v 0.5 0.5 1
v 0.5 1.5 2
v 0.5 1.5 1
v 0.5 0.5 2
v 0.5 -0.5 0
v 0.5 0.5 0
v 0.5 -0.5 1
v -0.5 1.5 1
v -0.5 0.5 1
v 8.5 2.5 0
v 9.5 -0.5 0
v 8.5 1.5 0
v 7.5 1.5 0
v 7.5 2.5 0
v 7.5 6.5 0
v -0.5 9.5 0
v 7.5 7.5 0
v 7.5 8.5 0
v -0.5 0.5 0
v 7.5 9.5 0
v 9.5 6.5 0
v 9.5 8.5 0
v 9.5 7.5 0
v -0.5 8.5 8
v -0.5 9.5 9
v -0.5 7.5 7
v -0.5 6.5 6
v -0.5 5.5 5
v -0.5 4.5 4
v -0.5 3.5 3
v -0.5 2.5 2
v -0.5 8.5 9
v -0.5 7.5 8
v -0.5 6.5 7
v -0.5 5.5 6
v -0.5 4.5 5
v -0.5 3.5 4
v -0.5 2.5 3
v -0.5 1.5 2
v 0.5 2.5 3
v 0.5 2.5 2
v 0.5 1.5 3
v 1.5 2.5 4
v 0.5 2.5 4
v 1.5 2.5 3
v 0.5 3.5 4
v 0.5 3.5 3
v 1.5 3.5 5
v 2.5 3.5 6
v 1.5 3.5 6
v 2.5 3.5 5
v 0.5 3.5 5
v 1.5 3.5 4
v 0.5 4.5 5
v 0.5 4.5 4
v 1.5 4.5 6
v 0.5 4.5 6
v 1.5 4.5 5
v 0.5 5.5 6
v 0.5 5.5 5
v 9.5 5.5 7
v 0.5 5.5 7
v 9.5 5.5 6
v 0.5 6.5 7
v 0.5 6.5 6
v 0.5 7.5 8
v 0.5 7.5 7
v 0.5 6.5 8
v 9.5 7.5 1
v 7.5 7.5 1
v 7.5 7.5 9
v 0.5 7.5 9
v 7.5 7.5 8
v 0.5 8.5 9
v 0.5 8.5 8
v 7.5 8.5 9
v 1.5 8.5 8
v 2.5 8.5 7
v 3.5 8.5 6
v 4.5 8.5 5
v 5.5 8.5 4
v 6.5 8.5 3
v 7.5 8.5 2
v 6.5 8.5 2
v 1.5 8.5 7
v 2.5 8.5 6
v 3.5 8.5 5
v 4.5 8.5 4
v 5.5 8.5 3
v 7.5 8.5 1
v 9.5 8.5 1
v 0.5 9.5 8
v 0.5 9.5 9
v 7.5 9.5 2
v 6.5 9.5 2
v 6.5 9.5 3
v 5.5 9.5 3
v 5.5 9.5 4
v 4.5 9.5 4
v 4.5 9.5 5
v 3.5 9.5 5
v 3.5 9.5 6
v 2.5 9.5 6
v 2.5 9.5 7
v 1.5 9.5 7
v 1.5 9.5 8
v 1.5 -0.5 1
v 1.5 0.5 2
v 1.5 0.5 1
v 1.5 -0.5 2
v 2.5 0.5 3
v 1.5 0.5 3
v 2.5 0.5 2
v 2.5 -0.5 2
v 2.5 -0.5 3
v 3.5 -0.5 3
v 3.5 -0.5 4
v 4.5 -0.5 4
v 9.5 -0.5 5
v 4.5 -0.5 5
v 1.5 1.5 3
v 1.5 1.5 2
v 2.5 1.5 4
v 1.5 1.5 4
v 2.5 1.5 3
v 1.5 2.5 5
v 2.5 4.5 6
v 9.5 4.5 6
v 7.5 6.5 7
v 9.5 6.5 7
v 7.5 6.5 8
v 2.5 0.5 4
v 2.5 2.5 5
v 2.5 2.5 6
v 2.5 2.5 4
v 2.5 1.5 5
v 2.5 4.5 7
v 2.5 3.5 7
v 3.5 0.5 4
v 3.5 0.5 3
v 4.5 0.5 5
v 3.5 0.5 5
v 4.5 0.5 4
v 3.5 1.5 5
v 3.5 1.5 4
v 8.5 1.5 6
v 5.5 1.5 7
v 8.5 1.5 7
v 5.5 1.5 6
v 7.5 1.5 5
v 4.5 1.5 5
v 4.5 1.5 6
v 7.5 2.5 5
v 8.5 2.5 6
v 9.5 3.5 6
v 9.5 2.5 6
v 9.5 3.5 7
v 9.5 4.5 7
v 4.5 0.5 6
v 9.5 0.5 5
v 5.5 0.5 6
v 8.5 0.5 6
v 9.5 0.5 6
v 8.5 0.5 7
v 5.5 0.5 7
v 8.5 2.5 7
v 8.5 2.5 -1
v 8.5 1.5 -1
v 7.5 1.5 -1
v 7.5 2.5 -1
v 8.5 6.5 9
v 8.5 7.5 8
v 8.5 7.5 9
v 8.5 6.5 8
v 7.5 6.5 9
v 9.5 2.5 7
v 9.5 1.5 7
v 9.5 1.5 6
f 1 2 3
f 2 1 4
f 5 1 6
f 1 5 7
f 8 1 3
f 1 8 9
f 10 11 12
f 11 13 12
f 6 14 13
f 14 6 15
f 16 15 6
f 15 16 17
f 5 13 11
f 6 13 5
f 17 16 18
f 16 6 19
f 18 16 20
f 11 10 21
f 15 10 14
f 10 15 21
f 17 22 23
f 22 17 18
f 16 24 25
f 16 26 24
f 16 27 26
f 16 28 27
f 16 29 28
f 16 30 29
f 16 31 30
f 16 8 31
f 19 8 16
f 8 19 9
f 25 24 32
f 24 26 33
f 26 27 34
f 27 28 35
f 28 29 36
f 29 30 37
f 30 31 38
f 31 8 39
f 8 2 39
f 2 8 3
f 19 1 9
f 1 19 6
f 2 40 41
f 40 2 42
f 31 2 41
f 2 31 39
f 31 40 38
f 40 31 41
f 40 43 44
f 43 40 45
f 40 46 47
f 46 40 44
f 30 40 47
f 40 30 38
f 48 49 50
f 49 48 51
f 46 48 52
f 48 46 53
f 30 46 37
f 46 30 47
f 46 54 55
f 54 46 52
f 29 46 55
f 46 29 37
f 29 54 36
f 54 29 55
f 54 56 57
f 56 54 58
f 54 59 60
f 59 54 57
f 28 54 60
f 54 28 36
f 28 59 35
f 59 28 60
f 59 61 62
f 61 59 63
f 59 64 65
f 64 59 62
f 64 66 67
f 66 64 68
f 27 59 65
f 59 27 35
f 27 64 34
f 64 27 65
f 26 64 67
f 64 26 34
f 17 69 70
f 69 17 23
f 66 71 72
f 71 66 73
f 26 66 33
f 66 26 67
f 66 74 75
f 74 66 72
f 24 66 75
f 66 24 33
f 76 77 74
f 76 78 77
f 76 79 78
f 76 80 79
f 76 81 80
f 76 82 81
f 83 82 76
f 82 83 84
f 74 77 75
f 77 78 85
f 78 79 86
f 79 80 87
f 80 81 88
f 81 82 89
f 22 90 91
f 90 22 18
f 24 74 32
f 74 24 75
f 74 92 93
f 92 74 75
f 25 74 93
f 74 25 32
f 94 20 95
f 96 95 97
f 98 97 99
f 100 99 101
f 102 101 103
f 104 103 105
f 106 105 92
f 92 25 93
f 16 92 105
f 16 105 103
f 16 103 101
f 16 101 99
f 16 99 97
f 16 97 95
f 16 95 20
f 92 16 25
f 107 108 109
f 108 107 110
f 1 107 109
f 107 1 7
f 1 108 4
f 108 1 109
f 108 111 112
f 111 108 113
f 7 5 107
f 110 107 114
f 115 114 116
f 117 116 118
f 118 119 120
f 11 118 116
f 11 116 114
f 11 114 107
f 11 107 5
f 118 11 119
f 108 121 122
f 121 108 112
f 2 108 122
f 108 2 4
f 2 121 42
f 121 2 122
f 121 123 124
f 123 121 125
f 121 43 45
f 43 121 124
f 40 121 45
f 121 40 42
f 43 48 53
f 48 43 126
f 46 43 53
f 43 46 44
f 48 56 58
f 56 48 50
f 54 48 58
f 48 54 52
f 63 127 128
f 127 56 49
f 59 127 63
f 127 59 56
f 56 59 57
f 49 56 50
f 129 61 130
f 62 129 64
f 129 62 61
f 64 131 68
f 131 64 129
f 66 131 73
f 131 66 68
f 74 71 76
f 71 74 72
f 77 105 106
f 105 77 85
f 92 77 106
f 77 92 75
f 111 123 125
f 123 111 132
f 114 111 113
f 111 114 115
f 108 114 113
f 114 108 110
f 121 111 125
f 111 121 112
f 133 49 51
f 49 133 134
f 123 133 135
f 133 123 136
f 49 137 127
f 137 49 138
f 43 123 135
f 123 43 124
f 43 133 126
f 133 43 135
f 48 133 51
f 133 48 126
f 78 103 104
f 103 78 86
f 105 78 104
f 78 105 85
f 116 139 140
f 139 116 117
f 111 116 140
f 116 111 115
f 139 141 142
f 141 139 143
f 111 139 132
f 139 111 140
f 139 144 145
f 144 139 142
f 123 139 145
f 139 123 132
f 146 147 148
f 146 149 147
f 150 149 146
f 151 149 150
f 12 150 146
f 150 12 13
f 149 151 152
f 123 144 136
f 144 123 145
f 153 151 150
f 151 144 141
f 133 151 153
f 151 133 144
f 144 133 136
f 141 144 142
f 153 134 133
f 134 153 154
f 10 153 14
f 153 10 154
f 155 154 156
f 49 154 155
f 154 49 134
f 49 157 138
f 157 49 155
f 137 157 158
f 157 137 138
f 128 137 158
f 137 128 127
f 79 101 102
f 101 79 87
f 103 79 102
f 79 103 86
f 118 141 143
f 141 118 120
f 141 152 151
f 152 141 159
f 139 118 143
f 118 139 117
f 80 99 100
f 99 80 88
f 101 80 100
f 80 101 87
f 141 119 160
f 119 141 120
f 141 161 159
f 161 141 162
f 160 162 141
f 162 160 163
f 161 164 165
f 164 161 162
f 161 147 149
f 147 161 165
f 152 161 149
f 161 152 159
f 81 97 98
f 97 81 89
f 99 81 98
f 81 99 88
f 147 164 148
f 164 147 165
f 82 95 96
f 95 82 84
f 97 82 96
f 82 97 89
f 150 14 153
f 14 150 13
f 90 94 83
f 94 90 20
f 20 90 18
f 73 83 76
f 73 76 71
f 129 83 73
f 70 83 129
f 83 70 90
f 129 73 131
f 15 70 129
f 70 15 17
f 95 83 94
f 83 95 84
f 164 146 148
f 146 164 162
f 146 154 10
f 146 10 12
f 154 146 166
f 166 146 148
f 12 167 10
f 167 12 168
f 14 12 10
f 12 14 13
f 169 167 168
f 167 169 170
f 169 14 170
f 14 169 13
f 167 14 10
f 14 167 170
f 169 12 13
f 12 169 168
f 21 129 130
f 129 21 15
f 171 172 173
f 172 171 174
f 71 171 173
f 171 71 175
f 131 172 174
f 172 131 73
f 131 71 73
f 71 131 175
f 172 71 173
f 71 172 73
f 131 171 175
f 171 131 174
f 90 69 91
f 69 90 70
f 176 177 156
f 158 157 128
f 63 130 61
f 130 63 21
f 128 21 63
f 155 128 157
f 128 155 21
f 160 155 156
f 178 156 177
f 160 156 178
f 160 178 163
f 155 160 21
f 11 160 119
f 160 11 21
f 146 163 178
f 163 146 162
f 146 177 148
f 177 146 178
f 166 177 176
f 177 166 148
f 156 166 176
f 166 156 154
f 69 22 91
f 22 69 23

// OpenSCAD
union() {
    translate([0, 1, 0.5]) cube([1, 1, 1], center=true);
    translate([0, 2, 1.0]) cube([1, 1, 2], center=true);
    translate([0, 3, 1.5]) cube([1, 1, 3], center=true);
    translate([0, 4, 2.0]) cube([1, 1, 4], center=true);
    translate([0, 5, 2.5]) cube([1, 1, 5], center=true);
    translate([0, 6, 3.0]) cube([1, 1, 6], center=true);
    translate([0, 7, 3.5]) cube([1, 1, 7], center=true);
    translate([0, 8, 4.0]) cube([1, 1, 8], center=true);
    translate([0, 9, 4.5]) cube([1, 1, 9], center=true);
    translate([1, 0, 0.5]) cube([1, 1, 1], center=true);
    translate([1, 1, 1.0]) cube([1, 1, 2], center=true);
    translate([1, 2, 1.5]) cube([1, 1, 3], center=true);
    translate([1, 3, 2.0]) cube([1, 1, 4], center=true);
    translate([1, 4, 2.5]) cube([1, 1, 5], center=true);
    translate([1, 5, 3.0]) cube([1, 1, 6], center=true);
    translate([1, 6, 3.5]) cube([1, 1, 7], center=true);
    translate([1, 7, 4.0]) cube([1, 1, 8], center=true);
    translate([1, 8, 4.5]) cube([1, 1, 9], center=true);
    translate([1, 9, 4.0]) cube([1, 1, 8], center=true);
    translate([2, 0, 1.0]) cube([1, 1, 2], center=true);
    translate([2, 1, 1.5]) cube([1, 1, 3], center=true);
    translate([2, 2, 2.0]) cube([1, 1, 4], center=true);
    translate([2, 3, 2.5]) cube([1, 1, 5], center=true);
    translate([2, 4, 3.0]) cube([1, 1, 6], center=true);
    translate([2, 5, 3.0]) cube([1, 1, 6], center=true);
    translate([2, 6, 3.5]) cube([1, 1, 7], center=true);
    translate([2, 7, 4.0]) cube([1, 1, 8], center=true);
    translate([2, 8, 4.5]) cube([1, 1, 9], center=true);
    translate([2, 9, 3.5]) cube([1, 1, 7], center=true);
    translate([3, 0, 1.5]) cube([1, 1, 3], center=true);
    translate([3, 1, 2.0]) cube([1, 1, 4], center=true);
    translate([3, 2, 2.5]) cube([1, 1, 5], center=true);
    translate([3, 3, 3.0]) cube([1, 1, 6], center=true);
    translate([3, 4, 3.5]) cube([1, 1, 7], center=true);
    translate([3, 5, 3.0]) cube([1, 1, 6], center=true);
    translate([3, 6, 3.5]) cube([1, 1, 7], center=true);
    translate([3, 7, 4.0]) cube([1, 1, 8], center=true);
    translate([3, 8, 4.5]) cube([1, 1, 9], center=true);
    translate([3, 9, 3.0]) cube([1, 1, 6], center=true);
    translate([4, 0, 2.0]) cube([1, 1, 4], center=true);
    translate([4, 1, 2.5]) cube([1, 1, 5], center=true);
    translate([4, 2, 2.5]) cube([1, 1, 5], center=true);
    translate([4, 3, 3.0]) cube([1, 1, 6], center=true);
    translate([4, 4, 3.5]) cube([1, 1, 7], center=true);
    translate([4, 5, 3.0]) cube([1, 1, 6], center=true);
    translate([4, 6, 3.5]) cube([1, 1, 7], center=true);
    translate([4, 7, 4.0]) cube([1, 1, 8], center=true);
    translate([4, 8, 4.5]) cube([1, 1, 9], center=true);
    translate([4, 9, 2.5]) cube([1, 1, 5], center=true);
    translate([5, 0, 2.5]) cube([1, 1, 5], center=true);
    translate([5, 1, 3.0]) cube([1, 1, 6], center=true);
    translate([5, 2, 2.5]) cube([1, 1, 5], center=true);
    translate([5, 3, 3.0]) cube([1, 1, 6], center=true);
    translate([5, 4, 3.5]) cube([1, 1, 7], center=true);
    translate([5, 5, 3.0]) cube([1, 1, 6], center=true);
    translate([5, 6, 3.5]) cube([1, 1, 7], center=true);
    translate([5, 7, 4.0]) cube([1, 1, 8], center=true);
    translate([5, 8, 4.5]) cube([1, 1, 9], center=true);
    translate([5, 9, 2.0]) cube([1, 1, 4], center=true);
    translate([6, 0, 2.5]) cube([1, 1, 5], center=true);
    translate([6, 1, 3.5]) cube([1, 1, 7], center=true);
    translate([6, 2, 2.5]) cube([1, 1, 5], center=true);
    translate([6, 3, 3.0]) cube([1, 1, 6], center=true);
    translate([6, 4, 3.5]) cube([1, 1, 7], center=true);
    translate([6, 5, 3.0]) cube([1, 1, 6], center=true);
    translate([6, 6, 3.5]) cube([1, 1, 7], center=true);
    translate([6, 7, 4.0]) cube([1, 1, 8], center=true);
    translate([6, 8, 4.5]) cube([1, 1, 9], center=true);
    translate([6, 9, 1.5]) cube([1, 1, 3], center=true);
    translate([7, 0, 2.5]) cube([1, 1, 5], center=true);
    translate([7, 1, 3.5]) cube([1, 1, 7], center=true);
    translate([7, 2, 2.5]) cube([1, 1, 5], center=true);
    translate([7, 3, 3.0]) cube([1, 1, 6], center=true);
    translate([7, 4, 3.5]) cube([1, 1, 7], center=true);
    translate([7, 5, 3.0]) cube([1, 1, 6], center=true);
    translate([7, 6, 3.5]) cube([1, 1, 7], center=true);
    translate([7, 7, 4.0]) cube([1, 1, 8], center=true);
    translate([7, 8, 4.5]) cube([1, 1, 9], center=true);
    translate([7, 9, 1.0]) cube([1, 1, 2], center=true);
    translate([8, 0, 2.5]) cube([1, 1, 5], center=true);
    translate([8, 1, 3.5]) cube([1, 1, 7], center=true);
    translate([8, 2, -0.5]) color([1, 0, 0]) cube([1, 1, 1], center=true);
    translate([8, 3, 3.0]) cube([1, 1, 6], center=true);
    translate([8, 4, 3.5]) cube([1, 1, 7], center=true);
    translate([8, 5, 3.0]) cube([1, 1, 6], center=true);
    translate([8, 6, 3.5]) cube([1, 1, 7], center=true);
    translate([8, 7, 8.5]) color([0, 0, 1]) cube([1, 1, 1], center=true);
    translate([8, 8, 0.5]) cube([1, 1, 1], center=true);
    translate([9, 0, 2.5]) cube([1, 1, 5], center=true);
    translate([9, 1, 3.0]) cube([1, 1, 6], center=true);
    translate([9, 2, 3.5]) cube([1, 1, 7], center=true);
    translate([9, 3, 3.0]) cube([1, 1, 6], center=true);
    translate([9, 4, 3.5]) cube([1, 1, 7], center=true);
    translate([9, 5, 3.0]) cube([1, 1, 6], center=true);
    translate([9, 6, 3.5]) cube([1, 1, 7], center=true);
    translate([9, 8, 0.5]) cube([1, 1, 1], center=true);
}
